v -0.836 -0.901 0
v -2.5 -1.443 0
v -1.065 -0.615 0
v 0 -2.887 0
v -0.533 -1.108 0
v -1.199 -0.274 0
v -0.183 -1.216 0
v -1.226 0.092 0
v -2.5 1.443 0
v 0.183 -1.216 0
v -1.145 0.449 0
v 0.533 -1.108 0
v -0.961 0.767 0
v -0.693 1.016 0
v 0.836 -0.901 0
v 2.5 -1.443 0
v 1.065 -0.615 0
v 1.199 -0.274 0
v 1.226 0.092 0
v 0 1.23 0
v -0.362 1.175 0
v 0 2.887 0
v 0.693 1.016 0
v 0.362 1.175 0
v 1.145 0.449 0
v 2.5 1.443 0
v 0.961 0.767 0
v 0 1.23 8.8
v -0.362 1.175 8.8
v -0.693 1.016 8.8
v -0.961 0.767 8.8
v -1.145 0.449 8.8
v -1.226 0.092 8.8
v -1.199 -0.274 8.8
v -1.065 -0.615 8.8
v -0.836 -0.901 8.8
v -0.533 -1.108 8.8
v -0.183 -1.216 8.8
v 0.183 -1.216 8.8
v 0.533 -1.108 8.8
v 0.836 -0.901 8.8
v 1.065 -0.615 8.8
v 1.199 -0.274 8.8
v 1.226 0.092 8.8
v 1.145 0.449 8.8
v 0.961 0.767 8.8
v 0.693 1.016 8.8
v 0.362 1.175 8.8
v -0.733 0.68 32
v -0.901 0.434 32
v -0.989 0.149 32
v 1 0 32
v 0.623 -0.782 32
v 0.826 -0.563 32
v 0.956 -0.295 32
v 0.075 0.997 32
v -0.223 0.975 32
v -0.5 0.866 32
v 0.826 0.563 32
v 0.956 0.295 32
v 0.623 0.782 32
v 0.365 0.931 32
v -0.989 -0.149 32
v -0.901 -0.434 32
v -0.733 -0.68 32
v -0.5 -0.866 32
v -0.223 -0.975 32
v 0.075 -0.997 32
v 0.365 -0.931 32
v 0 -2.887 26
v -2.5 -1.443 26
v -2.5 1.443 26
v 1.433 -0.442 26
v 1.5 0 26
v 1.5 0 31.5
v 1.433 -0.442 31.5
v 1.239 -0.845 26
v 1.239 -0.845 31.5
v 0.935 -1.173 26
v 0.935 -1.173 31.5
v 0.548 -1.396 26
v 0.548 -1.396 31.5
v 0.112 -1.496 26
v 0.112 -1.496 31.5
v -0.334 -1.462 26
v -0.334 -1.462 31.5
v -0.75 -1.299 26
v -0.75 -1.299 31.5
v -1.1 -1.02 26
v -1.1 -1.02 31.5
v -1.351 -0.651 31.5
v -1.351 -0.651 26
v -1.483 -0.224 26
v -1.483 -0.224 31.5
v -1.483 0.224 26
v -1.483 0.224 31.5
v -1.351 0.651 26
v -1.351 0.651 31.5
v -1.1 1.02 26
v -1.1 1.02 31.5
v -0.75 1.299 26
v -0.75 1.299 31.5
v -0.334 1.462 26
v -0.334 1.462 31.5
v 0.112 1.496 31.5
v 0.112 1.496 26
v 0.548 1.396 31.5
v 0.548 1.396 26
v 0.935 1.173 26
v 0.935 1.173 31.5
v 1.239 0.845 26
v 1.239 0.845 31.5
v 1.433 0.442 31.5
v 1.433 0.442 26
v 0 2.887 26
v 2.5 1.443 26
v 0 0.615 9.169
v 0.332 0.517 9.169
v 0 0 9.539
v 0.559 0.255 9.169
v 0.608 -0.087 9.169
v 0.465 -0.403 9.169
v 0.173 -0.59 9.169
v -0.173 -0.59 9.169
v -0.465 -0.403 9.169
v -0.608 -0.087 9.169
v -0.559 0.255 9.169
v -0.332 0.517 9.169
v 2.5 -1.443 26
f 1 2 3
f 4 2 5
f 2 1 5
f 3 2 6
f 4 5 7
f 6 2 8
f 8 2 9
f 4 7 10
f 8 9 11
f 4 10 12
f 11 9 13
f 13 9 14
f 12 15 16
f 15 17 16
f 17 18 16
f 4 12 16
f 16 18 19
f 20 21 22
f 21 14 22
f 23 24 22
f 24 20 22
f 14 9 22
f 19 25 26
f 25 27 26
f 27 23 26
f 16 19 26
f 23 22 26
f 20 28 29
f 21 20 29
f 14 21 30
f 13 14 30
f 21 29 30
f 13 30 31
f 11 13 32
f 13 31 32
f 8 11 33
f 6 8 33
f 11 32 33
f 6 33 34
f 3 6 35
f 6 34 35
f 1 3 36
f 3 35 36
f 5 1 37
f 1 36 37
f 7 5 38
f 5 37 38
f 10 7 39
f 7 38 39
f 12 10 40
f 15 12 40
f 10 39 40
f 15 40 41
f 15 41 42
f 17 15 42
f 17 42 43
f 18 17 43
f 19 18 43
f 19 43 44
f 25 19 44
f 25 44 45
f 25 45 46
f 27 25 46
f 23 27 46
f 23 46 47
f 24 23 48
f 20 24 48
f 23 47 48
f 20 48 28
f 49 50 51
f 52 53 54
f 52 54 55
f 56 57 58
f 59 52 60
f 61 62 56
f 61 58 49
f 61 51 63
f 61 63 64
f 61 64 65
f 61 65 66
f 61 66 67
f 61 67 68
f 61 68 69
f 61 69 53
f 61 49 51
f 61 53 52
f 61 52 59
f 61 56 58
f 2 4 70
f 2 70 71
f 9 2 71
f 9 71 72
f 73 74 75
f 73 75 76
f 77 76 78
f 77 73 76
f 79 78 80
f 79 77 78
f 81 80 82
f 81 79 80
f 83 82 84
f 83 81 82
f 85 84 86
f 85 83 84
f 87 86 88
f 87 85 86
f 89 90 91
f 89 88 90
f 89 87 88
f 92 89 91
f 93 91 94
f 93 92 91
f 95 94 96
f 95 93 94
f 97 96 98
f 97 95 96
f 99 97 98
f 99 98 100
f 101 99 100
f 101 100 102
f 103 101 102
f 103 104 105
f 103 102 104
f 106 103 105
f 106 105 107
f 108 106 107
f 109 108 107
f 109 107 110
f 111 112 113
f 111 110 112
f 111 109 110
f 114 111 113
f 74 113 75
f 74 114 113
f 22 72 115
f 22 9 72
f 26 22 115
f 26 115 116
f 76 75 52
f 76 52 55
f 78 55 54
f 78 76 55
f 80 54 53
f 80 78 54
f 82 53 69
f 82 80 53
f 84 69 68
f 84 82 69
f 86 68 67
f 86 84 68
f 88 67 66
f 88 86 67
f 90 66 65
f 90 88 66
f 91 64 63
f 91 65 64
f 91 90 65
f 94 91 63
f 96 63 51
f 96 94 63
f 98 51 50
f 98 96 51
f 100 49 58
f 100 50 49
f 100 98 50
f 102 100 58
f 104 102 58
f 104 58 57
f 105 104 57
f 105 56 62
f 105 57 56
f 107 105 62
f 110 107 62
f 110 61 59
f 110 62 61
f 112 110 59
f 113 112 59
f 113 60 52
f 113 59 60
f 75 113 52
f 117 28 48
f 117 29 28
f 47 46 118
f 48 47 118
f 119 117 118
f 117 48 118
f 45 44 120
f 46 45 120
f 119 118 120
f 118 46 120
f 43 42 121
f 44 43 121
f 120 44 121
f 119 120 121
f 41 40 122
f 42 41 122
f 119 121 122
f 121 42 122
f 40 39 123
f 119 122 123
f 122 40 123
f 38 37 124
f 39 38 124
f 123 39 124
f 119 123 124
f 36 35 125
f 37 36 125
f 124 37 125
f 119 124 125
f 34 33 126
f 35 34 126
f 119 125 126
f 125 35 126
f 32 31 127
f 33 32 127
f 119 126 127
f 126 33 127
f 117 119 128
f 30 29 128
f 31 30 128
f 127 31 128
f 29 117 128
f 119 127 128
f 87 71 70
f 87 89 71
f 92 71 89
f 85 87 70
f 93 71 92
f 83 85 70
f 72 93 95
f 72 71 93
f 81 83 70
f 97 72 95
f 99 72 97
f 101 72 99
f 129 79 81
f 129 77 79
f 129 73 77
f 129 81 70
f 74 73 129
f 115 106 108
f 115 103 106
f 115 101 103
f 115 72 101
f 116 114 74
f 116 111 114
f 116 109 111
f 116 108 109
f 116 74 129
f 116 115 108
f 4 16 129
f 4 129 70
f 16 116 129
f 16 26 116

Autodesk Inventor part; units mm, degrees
ref_plane "YZ Plane" through (0, 0, 0) normal (1, 0, 0) x (0, 1, 0)
ref_plane "XZ Plane" through (0, 0, 0) normal (0, 1, 0) x (-1, 0, 0)
ref_plane "XY Plane" through (0, 0, 0) normal (0, 0, 1) x (1, 0, 0)
sketch "Sketch1" plane through (0, 0, 0) normal (0, 0, 1) x (1, 0, 0)
  line L0 (2.5, 1.4434) -> (2.5, -1.4434)
  line L1 (2.5, -1.4434) -> (0, -2.8868)
  line L2 (0, -2.8868) -> (-2.5, -1.4434)
  line L3 (-2.5, -1.4434) -> (-2.5, 1.4434)
  line L4 (-2.5, 1.4434) -> (0, 2.8868)
  line L5 (0, 2.8868) -> (2.5, 1.4434)
  point P0 (0, 0)
  point P1 (0, 0)
  dimension "d0" = 5
extrude "Extrusion1" add sketch "Sketch1" along normal blind 26
sketch "Sketch2" plane through (0, 0, 26) normal (0, 0, 1) x (1, 0, 0)
  circle A0 centre (0, 0) radius 1.5
  dimension "d3" = 3
extrude "Extrusion2" add sketch "Sketch2" along normal blind 6
chamfer "Chamfer1" distance 0.5 angle 45 1 edges at (-1.5, 0, 32)
thread "Thread1" size "M3x0.5" class "6g" standard "ANSI Metric M Profile" full length
sketch "Sketch3" plane through (0, 0, 0) normal (0, 0, -1) x (-1, 0, 0)
  point P0 (0, 0)
  point P1 (0, 0)
hole "Hole1" at (0, 0, 0) direction (0, 0, 1) diameter 2.459 depth 8.8 tip angle 118 thread size "M3x0.5" class "6H" standard "ISO Metric profile"
properties part number "M3_26mm_Abstands"
